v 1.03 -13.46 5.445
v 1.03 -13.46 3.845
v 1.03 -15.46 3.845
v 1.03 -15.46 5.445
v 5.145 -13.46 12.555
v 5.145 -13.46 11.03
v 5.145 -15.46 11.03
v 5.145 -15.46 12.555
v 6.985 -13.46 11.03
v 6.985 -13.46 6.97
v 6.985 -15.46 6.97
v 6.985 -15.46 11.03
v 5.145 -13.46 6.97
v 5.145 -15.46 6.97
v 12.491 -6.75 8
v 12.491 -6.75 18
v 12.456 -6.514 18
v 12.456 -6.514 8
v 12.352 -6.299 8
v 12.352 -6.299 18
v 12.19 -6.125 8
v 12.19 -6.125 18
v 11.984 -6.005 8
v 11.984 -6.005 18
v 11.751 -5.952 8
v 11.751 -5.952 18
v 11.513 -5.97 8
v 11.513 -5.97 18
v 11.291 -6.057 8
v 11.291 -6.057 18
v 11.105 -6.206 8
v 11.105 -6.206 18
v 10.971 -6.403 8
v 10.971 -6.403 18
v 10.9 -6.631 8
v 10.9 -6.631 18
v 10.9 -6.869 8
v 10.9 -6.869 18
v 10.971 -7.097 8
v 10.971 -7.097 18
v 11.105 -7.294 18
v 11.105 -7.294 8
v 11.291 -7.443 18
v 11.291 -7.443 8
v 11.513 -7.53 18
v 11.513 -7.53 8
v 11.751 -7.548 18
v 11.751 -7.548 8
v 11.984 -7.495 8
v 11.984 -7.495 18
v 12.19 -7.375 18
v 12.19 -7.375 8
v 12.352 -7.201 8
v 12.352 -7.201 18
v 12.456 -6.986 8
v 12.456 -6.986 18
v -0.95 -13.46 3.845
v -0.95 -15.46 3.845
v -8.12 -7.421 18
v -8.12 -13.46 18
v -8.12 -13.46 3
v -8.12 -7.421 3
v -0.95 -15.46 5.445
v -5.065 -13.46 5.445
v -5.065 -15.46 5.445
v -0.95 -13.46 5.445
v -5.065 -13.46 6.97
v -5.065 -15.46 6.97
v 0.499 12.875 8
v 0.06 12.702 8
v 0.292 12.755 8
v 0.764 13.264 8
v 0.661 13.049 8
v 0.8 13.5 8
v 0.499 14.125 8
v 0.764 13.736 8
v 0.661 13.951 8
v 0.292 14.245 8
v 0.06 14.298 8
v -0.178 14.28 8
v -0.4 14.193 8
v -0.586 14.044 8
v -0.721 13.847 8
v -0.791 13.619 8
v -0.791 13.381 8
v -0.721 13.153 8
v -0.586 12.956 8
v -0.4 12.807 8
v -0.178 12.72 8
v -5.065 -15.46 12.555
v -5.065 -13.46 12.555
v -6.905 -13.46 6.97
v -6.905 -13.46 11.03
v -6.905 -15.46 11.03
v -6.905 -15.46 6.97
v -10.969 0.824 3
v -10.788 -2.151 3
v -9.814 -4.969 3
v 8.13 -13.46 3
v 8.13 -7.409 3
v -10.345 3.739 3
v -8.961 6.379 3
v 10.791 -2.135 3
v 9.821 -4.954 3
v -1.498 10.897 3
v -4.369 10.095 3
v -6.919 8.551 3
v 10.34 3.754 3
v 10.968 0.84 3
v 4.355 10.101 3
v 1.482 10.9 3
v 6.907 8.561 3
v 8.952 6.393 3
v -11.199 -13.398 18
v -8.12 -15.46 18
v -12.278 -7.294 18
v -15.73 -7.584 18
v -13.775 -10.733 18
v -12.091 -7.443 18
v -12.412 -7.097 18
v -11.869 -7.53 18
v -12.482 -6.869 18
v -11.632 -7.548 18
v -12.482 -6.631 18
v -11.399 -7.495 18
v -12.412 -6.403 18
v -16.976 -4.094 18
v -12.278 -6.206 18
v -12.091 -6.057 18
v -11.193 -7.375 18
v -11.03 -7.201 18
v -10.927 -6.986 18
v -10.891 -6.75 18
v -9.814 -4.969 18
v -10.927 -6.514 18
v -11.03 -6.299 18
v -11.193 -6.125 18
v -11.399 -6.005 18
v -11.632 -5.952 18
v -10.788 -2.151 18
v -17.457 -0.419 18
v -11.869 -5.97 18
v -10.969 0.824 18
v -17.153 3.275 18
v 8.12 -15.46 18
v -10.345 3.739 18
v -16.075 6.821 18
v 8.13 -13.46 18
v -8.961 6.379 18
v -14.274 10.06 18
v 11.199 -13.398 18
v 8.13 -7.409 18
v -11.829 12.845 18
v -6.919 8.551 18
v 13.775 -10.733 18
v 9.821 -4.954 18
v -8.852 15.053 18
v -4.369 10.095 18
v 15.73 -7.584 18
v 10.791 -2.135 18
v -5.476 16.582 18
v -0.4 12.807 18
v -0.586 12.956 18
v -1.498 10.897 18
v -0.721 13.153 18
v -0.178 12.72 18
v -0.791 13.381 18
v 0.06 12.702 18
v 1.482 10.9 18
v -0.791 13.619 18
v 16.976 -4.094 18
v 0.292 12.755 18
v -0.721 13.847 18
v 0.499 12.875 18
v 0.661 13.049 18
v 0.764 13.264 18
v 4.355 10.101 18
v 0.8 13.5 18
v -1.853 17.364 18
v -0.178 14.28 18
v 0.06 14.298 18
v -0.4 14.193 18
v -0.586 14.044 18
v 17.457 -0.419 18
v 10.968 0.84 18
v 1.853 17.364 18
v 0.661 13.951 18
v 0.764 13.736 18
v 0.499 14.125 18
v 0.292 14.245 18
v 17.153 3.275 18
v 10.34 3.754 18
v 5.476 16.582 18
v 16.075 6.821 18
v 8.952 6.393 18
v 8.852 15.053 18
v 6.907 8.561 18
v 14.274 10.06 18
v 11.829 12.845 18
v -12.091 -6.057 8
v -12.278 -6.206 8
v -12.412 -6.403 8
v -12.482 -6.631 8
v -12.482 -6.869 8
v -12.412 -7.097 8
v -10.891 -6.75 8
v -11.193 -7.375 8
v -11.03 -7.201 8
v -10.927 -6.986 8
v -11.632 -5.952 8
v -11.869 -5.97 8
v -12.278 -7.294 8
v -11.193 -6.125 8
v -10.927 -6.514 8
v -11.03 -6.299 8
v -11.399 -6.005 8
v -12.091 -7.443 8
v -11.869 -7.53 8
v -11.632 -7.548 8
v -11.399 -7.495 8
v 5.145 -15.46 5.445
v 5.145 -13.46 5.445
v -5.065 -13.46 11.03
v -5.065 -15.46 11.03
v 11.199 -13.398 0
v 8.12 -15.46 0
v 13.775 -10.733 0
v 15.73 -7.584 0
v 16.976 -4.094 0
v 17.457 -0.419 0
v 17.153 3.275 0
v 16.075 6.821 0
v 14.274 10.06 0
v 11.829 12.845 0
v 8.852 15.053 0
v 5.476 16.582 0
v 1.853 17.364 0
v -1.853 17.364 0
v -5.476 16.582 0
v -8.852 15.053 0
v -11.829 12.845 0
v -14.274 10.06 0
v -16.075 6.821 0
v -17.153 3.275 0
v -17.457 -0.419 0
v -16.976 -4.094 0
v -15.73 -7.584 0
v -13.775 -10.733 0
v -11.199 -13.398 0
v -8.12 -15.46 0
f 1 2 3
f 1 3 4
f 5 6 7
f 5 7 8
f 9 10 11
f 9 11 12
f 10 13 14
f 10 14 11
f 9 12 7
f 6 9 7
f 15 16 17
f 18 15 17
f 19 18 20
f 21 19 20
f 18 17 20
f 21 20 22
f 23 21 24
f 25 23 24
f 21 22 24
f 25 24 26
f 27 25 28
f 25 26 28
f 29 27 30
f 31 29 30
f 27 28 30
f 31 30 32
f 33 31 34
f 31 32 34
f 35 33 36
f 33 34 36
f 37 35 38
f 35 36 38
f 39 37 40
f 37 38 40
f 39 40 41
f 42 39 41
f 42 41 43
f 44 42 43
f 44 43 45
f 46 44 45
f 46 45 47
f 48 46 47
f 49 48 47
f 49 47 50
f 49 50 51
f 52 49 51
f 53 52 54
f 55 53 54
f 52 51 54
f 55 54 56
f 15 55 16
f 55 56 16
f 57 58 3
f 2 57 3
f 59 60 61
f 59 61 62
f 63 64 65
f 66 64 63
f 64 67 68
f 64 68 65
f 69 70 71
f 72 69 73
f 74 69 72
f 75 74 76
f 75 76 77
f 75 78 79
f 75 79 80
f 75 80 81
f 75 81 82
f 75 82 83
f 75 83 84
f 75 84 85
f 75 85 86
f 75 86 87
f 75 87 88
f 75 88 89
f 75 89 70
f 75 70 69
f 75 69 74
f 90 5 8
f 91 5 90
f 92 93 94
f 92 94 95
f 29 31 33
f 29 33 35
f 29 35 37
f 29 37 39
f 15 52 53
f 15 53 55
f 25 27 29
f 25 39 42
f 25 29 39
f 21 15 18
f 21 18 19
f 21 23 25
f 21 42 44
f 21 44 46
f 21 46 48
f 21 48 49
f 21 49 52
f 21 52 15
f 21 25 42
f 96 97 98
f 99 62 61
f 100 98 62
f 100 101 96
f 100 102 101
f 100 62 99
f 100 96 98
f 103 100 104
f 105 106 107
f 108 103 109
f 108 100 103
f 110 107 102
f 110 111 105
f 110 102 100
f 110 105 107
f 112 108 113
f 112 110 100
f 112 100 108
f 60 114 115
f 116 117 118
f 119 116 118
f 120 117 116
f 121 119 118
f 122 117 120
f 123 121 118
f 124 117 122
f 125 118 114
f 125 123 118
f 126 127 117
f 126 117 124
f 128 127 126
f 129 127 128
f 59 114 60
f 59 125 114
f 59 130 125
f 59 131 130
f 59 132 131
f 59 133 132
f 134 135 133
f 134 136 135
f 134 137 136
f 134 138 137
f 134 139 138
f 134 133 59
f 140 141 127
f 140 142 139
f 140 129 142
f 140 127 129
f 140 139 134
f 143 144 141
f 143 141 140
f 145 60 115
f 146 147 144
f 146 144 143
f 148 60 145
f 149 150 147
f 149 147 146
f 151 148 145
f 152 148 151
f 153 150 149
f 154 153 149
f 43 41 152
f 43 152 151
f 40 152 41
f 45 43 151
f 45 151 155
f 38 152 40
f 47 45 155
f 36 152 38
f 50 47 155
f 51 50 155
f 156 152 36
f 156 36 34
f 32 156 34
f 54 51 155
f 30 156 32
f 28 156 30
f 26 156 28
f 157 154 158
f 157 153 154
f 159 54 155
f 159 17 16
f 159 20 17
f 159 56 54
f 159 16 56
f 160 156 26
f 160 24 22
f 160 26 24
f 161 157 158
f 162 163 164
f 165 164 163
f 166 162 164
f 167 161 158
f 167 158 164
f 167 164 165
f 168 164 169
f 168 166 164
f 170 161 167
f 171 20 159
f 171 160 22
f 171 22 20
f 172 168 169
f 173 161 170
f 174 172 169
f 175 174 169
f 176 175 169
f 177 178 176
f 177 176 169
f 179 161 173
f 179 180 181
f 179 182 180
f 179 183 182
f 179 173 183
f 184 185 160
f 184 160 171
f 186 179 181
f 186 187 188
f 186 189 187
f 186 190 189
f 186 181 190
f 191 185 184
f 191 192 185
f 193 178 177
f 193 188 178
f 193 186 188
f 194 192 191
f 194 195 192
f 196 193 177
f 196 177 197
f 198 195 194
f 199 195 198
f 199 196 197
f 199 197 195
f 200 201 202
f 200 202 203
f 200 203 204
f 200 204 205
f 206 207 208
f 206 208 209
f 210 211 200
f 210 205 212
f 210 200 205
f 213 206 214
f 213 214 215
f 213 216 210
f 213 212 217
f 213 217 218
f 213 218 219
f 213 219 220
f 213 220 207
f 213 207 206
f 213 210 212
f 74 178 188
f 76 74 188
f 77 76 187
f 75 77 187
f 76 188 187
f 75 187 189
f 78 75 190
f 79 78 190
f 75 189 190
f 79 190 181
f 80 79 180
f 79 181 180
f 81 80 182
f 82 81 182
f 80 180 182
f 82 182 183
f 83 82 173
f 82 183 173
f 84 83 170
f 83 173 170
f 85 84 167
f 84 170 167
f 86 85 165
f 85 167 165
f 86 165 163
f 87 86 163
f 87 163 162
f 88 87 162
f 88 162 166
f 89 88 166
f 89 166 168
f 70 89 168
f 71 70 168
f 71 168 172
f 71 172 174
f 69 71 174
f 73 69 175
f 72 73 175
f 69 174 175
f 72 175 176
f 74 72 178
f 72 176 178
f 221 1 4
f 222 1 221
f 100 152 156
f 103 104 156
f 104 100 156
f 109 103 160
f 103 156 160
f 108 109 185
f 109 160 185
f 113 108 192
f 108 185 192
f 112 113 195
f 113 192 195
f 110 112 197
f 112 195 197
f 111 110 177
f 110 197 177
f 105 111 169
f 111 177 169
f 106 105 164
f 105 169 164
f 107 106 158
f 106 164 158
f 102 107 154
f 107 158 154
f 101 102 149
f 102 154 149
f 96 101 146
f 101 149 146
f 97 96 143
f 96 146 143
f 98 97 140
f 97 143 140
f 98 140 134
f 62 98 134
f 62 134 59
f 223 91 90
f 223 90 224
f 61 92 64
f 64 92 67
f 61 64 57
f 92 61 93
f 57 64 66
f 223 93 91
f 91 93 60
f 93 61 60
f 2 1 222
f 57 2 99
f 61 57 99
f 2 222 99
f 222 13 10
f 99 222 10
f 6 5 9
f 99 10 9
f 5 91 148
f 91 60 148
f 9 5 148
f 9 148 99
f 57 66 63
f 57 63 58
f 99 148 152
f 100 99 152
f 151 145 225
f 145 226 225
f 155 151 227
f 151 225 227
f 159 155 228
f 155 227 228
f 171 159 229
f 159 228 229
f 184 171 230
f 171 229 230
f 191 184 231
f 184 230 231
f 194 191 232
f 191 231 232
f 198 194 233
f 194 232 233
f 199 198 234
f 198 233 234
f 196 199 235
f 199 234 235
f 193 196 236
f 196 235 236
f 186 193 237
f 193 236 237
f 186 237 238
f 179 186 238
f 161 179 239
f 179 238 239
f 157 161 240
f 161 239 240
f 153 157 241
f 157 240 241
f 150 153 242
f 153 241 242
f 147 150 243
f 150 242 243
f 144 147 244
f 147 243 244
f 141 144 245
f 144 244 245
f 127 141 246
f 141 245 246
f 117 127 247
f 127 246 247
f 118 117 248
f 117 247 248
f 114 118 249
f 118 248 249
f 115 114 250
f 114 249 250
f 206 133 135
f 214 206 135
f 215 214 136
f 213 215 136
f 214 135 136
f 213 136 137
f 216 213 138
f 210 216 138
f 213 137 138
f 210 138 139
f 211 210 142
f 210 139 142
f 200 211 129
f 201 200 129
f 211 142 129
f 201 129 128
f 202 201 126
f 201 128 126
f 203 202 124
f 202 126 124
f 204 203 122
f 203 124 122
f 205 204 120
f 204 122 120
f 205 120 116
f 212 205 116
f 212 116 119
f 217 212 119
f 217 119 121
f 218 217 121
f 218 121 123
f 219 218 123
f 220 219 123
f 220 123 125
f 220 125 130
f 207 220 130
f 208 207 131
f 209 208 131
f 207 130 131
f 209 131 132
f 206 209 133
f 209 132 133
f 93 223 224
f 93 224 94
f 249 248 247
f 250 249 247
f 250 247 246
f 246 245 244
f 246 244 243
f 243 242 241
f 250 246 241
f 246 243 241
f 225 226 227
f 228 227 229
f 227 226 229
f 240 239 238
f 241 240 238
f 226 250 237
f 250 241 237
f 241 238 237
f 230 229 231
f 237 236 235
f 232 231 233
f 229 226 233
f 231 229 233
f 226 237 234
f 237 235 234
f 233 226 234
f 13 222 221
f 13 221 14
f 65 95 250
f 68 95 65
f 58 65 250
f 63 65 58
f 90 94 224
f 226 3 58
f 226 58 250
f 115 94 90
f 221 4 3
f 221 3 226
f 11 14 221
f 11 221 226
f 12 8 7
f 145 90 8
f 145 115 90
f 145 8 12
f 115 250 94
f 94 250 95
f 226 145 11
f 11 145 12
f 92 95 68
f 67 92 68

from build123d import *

# Parameters (mm, degrees)
SKETCH2_R           = 17.4625
BOSS_EXTRUDE1_DEPTH = 18
SKETCH13_R          = 0.8
CUT_EXTRUDE6_DEPTH  = 10
SKETCH16_R          = 11
CUT_EXTRUDE9_DEPTH  = 15
CUT_EXTRUDE11_DEPTH = 22
SKETCH21_W          = 16.25
SKETCH21_H          = 2.78436417
CUT_EXTRUDE12_DEPTH = 31.559414466
CUT_EXTRUDE13_REACH = 32.559
SKETCH24_W          = 16.25
SKETCH24_H          = 6.70136321


with BuildPart() as part:
    # Sketch2 → Boss-Extrude1 (new body)
    with BuildSketch(Plane.XY):
        Circle(SKETCH2_R)
    extrude(amount=BOSS_EXTRUDE1_DEPTH)

    # Sketch13 → Cut-Extrude6 (cut)
    with BuildSketch(Plane.XY.offset(18)):
        with Locations((0, 13.5)):
            Circle(SKETCH13_R)
        with Locations((11.691342951, -6.75)):
            Circle(SKETCH13_R)
        with Locations((-11.691342951, -6.75)):
            Circle(SKETCH13_R)
    extrude(amount=-CUT_EXTRUDE6_DEPTH, mode=Mode.SUBTRACT)

    # Sketch16 → Cut-Extrude9 (cut)
    with BuildSketch(Plane.XY.offset(18)):
        Circle(SKETCH16_R)
    extrude(amount=-CUT_EXTRUDE9_DEPTH, mode=Mode.SUBTRACT)

    # Sketch20 → Cut-Extrude11 (cut)
    with BuildSketch(Plane(origin=(5.95728493, 0, -11.08430825), x_dir=(0, 0, 1), z_dir=(0, 1, 0))):
        Polygon((16.52930825, -11.021800725), (16.52930825, -6.906800725), (14.92930825, -6.906800725), (14.92930825, -4.926800725), (16.52930825, -4.926800725), (16.52930825, -0.811800725), (18.05430825, -0.811800725), (18.05430825, 1.028199275), (22.11430825, 1.028199275), (22.11430825, -0.811800725), (23.63930825, -0.811800725), (23.63930825, -11.021800725), (22.11430825, -11.021800725), (22.11430825, -12.861800725), (18.05430825, -12.861800725), (18.05430825, -11.021800725), align=None)
    extrude(amount=-CUT_EXTRUDE11_DEPTH, mode=Mode.SUBTRACT)

    # Sketch21 → Cut-Extrude12 (cut, through all)
    with BuildSketch(Plane.XY.offset(18)):
        with Locations((0, -16.852182085)):
            Rectangle(SKETCH21_W, SKETCH21_H)
    extrude(amount=-CUT_EXTRUDE12_DEPTH, mode=Mode.SUBTRACT)

    # Cut-Extrude13: up to this face of the body (flat: up to its plane)
    cut_extrude13_end = Plane(part.part.faces().sort_by_distance((0, 0, 3))[0])
    # Sketch24 → Cut-Extrude13 (cut, up to the picked face)
    with BuildSketch(Plane.XY.offset(18), mode=Mode.PRIVATE) as cut_extrude13_sk1:
        with Locations((0.005436819, -10.109318395)):
            Rectangle(SKETCH24_W, SKETCH24_H)
    cut_extrude13_tool1 = split(extrude(cut_extrude13_sk1.sketch, amount=-CUT_EXTRUDE13_REACH, mode=Mode.PRIVATE), bisect_by=cut_extrude13_end, keep=Keep.BOTH, mode=Mode.PRIVATE)
    add(cut_extrude13_tool1.solids().sort_by(Axis((0.005437, -10.109318, 18), (0, 0, -1)))[0], mode=Mode.SUBTRACT)


solid = part.part
